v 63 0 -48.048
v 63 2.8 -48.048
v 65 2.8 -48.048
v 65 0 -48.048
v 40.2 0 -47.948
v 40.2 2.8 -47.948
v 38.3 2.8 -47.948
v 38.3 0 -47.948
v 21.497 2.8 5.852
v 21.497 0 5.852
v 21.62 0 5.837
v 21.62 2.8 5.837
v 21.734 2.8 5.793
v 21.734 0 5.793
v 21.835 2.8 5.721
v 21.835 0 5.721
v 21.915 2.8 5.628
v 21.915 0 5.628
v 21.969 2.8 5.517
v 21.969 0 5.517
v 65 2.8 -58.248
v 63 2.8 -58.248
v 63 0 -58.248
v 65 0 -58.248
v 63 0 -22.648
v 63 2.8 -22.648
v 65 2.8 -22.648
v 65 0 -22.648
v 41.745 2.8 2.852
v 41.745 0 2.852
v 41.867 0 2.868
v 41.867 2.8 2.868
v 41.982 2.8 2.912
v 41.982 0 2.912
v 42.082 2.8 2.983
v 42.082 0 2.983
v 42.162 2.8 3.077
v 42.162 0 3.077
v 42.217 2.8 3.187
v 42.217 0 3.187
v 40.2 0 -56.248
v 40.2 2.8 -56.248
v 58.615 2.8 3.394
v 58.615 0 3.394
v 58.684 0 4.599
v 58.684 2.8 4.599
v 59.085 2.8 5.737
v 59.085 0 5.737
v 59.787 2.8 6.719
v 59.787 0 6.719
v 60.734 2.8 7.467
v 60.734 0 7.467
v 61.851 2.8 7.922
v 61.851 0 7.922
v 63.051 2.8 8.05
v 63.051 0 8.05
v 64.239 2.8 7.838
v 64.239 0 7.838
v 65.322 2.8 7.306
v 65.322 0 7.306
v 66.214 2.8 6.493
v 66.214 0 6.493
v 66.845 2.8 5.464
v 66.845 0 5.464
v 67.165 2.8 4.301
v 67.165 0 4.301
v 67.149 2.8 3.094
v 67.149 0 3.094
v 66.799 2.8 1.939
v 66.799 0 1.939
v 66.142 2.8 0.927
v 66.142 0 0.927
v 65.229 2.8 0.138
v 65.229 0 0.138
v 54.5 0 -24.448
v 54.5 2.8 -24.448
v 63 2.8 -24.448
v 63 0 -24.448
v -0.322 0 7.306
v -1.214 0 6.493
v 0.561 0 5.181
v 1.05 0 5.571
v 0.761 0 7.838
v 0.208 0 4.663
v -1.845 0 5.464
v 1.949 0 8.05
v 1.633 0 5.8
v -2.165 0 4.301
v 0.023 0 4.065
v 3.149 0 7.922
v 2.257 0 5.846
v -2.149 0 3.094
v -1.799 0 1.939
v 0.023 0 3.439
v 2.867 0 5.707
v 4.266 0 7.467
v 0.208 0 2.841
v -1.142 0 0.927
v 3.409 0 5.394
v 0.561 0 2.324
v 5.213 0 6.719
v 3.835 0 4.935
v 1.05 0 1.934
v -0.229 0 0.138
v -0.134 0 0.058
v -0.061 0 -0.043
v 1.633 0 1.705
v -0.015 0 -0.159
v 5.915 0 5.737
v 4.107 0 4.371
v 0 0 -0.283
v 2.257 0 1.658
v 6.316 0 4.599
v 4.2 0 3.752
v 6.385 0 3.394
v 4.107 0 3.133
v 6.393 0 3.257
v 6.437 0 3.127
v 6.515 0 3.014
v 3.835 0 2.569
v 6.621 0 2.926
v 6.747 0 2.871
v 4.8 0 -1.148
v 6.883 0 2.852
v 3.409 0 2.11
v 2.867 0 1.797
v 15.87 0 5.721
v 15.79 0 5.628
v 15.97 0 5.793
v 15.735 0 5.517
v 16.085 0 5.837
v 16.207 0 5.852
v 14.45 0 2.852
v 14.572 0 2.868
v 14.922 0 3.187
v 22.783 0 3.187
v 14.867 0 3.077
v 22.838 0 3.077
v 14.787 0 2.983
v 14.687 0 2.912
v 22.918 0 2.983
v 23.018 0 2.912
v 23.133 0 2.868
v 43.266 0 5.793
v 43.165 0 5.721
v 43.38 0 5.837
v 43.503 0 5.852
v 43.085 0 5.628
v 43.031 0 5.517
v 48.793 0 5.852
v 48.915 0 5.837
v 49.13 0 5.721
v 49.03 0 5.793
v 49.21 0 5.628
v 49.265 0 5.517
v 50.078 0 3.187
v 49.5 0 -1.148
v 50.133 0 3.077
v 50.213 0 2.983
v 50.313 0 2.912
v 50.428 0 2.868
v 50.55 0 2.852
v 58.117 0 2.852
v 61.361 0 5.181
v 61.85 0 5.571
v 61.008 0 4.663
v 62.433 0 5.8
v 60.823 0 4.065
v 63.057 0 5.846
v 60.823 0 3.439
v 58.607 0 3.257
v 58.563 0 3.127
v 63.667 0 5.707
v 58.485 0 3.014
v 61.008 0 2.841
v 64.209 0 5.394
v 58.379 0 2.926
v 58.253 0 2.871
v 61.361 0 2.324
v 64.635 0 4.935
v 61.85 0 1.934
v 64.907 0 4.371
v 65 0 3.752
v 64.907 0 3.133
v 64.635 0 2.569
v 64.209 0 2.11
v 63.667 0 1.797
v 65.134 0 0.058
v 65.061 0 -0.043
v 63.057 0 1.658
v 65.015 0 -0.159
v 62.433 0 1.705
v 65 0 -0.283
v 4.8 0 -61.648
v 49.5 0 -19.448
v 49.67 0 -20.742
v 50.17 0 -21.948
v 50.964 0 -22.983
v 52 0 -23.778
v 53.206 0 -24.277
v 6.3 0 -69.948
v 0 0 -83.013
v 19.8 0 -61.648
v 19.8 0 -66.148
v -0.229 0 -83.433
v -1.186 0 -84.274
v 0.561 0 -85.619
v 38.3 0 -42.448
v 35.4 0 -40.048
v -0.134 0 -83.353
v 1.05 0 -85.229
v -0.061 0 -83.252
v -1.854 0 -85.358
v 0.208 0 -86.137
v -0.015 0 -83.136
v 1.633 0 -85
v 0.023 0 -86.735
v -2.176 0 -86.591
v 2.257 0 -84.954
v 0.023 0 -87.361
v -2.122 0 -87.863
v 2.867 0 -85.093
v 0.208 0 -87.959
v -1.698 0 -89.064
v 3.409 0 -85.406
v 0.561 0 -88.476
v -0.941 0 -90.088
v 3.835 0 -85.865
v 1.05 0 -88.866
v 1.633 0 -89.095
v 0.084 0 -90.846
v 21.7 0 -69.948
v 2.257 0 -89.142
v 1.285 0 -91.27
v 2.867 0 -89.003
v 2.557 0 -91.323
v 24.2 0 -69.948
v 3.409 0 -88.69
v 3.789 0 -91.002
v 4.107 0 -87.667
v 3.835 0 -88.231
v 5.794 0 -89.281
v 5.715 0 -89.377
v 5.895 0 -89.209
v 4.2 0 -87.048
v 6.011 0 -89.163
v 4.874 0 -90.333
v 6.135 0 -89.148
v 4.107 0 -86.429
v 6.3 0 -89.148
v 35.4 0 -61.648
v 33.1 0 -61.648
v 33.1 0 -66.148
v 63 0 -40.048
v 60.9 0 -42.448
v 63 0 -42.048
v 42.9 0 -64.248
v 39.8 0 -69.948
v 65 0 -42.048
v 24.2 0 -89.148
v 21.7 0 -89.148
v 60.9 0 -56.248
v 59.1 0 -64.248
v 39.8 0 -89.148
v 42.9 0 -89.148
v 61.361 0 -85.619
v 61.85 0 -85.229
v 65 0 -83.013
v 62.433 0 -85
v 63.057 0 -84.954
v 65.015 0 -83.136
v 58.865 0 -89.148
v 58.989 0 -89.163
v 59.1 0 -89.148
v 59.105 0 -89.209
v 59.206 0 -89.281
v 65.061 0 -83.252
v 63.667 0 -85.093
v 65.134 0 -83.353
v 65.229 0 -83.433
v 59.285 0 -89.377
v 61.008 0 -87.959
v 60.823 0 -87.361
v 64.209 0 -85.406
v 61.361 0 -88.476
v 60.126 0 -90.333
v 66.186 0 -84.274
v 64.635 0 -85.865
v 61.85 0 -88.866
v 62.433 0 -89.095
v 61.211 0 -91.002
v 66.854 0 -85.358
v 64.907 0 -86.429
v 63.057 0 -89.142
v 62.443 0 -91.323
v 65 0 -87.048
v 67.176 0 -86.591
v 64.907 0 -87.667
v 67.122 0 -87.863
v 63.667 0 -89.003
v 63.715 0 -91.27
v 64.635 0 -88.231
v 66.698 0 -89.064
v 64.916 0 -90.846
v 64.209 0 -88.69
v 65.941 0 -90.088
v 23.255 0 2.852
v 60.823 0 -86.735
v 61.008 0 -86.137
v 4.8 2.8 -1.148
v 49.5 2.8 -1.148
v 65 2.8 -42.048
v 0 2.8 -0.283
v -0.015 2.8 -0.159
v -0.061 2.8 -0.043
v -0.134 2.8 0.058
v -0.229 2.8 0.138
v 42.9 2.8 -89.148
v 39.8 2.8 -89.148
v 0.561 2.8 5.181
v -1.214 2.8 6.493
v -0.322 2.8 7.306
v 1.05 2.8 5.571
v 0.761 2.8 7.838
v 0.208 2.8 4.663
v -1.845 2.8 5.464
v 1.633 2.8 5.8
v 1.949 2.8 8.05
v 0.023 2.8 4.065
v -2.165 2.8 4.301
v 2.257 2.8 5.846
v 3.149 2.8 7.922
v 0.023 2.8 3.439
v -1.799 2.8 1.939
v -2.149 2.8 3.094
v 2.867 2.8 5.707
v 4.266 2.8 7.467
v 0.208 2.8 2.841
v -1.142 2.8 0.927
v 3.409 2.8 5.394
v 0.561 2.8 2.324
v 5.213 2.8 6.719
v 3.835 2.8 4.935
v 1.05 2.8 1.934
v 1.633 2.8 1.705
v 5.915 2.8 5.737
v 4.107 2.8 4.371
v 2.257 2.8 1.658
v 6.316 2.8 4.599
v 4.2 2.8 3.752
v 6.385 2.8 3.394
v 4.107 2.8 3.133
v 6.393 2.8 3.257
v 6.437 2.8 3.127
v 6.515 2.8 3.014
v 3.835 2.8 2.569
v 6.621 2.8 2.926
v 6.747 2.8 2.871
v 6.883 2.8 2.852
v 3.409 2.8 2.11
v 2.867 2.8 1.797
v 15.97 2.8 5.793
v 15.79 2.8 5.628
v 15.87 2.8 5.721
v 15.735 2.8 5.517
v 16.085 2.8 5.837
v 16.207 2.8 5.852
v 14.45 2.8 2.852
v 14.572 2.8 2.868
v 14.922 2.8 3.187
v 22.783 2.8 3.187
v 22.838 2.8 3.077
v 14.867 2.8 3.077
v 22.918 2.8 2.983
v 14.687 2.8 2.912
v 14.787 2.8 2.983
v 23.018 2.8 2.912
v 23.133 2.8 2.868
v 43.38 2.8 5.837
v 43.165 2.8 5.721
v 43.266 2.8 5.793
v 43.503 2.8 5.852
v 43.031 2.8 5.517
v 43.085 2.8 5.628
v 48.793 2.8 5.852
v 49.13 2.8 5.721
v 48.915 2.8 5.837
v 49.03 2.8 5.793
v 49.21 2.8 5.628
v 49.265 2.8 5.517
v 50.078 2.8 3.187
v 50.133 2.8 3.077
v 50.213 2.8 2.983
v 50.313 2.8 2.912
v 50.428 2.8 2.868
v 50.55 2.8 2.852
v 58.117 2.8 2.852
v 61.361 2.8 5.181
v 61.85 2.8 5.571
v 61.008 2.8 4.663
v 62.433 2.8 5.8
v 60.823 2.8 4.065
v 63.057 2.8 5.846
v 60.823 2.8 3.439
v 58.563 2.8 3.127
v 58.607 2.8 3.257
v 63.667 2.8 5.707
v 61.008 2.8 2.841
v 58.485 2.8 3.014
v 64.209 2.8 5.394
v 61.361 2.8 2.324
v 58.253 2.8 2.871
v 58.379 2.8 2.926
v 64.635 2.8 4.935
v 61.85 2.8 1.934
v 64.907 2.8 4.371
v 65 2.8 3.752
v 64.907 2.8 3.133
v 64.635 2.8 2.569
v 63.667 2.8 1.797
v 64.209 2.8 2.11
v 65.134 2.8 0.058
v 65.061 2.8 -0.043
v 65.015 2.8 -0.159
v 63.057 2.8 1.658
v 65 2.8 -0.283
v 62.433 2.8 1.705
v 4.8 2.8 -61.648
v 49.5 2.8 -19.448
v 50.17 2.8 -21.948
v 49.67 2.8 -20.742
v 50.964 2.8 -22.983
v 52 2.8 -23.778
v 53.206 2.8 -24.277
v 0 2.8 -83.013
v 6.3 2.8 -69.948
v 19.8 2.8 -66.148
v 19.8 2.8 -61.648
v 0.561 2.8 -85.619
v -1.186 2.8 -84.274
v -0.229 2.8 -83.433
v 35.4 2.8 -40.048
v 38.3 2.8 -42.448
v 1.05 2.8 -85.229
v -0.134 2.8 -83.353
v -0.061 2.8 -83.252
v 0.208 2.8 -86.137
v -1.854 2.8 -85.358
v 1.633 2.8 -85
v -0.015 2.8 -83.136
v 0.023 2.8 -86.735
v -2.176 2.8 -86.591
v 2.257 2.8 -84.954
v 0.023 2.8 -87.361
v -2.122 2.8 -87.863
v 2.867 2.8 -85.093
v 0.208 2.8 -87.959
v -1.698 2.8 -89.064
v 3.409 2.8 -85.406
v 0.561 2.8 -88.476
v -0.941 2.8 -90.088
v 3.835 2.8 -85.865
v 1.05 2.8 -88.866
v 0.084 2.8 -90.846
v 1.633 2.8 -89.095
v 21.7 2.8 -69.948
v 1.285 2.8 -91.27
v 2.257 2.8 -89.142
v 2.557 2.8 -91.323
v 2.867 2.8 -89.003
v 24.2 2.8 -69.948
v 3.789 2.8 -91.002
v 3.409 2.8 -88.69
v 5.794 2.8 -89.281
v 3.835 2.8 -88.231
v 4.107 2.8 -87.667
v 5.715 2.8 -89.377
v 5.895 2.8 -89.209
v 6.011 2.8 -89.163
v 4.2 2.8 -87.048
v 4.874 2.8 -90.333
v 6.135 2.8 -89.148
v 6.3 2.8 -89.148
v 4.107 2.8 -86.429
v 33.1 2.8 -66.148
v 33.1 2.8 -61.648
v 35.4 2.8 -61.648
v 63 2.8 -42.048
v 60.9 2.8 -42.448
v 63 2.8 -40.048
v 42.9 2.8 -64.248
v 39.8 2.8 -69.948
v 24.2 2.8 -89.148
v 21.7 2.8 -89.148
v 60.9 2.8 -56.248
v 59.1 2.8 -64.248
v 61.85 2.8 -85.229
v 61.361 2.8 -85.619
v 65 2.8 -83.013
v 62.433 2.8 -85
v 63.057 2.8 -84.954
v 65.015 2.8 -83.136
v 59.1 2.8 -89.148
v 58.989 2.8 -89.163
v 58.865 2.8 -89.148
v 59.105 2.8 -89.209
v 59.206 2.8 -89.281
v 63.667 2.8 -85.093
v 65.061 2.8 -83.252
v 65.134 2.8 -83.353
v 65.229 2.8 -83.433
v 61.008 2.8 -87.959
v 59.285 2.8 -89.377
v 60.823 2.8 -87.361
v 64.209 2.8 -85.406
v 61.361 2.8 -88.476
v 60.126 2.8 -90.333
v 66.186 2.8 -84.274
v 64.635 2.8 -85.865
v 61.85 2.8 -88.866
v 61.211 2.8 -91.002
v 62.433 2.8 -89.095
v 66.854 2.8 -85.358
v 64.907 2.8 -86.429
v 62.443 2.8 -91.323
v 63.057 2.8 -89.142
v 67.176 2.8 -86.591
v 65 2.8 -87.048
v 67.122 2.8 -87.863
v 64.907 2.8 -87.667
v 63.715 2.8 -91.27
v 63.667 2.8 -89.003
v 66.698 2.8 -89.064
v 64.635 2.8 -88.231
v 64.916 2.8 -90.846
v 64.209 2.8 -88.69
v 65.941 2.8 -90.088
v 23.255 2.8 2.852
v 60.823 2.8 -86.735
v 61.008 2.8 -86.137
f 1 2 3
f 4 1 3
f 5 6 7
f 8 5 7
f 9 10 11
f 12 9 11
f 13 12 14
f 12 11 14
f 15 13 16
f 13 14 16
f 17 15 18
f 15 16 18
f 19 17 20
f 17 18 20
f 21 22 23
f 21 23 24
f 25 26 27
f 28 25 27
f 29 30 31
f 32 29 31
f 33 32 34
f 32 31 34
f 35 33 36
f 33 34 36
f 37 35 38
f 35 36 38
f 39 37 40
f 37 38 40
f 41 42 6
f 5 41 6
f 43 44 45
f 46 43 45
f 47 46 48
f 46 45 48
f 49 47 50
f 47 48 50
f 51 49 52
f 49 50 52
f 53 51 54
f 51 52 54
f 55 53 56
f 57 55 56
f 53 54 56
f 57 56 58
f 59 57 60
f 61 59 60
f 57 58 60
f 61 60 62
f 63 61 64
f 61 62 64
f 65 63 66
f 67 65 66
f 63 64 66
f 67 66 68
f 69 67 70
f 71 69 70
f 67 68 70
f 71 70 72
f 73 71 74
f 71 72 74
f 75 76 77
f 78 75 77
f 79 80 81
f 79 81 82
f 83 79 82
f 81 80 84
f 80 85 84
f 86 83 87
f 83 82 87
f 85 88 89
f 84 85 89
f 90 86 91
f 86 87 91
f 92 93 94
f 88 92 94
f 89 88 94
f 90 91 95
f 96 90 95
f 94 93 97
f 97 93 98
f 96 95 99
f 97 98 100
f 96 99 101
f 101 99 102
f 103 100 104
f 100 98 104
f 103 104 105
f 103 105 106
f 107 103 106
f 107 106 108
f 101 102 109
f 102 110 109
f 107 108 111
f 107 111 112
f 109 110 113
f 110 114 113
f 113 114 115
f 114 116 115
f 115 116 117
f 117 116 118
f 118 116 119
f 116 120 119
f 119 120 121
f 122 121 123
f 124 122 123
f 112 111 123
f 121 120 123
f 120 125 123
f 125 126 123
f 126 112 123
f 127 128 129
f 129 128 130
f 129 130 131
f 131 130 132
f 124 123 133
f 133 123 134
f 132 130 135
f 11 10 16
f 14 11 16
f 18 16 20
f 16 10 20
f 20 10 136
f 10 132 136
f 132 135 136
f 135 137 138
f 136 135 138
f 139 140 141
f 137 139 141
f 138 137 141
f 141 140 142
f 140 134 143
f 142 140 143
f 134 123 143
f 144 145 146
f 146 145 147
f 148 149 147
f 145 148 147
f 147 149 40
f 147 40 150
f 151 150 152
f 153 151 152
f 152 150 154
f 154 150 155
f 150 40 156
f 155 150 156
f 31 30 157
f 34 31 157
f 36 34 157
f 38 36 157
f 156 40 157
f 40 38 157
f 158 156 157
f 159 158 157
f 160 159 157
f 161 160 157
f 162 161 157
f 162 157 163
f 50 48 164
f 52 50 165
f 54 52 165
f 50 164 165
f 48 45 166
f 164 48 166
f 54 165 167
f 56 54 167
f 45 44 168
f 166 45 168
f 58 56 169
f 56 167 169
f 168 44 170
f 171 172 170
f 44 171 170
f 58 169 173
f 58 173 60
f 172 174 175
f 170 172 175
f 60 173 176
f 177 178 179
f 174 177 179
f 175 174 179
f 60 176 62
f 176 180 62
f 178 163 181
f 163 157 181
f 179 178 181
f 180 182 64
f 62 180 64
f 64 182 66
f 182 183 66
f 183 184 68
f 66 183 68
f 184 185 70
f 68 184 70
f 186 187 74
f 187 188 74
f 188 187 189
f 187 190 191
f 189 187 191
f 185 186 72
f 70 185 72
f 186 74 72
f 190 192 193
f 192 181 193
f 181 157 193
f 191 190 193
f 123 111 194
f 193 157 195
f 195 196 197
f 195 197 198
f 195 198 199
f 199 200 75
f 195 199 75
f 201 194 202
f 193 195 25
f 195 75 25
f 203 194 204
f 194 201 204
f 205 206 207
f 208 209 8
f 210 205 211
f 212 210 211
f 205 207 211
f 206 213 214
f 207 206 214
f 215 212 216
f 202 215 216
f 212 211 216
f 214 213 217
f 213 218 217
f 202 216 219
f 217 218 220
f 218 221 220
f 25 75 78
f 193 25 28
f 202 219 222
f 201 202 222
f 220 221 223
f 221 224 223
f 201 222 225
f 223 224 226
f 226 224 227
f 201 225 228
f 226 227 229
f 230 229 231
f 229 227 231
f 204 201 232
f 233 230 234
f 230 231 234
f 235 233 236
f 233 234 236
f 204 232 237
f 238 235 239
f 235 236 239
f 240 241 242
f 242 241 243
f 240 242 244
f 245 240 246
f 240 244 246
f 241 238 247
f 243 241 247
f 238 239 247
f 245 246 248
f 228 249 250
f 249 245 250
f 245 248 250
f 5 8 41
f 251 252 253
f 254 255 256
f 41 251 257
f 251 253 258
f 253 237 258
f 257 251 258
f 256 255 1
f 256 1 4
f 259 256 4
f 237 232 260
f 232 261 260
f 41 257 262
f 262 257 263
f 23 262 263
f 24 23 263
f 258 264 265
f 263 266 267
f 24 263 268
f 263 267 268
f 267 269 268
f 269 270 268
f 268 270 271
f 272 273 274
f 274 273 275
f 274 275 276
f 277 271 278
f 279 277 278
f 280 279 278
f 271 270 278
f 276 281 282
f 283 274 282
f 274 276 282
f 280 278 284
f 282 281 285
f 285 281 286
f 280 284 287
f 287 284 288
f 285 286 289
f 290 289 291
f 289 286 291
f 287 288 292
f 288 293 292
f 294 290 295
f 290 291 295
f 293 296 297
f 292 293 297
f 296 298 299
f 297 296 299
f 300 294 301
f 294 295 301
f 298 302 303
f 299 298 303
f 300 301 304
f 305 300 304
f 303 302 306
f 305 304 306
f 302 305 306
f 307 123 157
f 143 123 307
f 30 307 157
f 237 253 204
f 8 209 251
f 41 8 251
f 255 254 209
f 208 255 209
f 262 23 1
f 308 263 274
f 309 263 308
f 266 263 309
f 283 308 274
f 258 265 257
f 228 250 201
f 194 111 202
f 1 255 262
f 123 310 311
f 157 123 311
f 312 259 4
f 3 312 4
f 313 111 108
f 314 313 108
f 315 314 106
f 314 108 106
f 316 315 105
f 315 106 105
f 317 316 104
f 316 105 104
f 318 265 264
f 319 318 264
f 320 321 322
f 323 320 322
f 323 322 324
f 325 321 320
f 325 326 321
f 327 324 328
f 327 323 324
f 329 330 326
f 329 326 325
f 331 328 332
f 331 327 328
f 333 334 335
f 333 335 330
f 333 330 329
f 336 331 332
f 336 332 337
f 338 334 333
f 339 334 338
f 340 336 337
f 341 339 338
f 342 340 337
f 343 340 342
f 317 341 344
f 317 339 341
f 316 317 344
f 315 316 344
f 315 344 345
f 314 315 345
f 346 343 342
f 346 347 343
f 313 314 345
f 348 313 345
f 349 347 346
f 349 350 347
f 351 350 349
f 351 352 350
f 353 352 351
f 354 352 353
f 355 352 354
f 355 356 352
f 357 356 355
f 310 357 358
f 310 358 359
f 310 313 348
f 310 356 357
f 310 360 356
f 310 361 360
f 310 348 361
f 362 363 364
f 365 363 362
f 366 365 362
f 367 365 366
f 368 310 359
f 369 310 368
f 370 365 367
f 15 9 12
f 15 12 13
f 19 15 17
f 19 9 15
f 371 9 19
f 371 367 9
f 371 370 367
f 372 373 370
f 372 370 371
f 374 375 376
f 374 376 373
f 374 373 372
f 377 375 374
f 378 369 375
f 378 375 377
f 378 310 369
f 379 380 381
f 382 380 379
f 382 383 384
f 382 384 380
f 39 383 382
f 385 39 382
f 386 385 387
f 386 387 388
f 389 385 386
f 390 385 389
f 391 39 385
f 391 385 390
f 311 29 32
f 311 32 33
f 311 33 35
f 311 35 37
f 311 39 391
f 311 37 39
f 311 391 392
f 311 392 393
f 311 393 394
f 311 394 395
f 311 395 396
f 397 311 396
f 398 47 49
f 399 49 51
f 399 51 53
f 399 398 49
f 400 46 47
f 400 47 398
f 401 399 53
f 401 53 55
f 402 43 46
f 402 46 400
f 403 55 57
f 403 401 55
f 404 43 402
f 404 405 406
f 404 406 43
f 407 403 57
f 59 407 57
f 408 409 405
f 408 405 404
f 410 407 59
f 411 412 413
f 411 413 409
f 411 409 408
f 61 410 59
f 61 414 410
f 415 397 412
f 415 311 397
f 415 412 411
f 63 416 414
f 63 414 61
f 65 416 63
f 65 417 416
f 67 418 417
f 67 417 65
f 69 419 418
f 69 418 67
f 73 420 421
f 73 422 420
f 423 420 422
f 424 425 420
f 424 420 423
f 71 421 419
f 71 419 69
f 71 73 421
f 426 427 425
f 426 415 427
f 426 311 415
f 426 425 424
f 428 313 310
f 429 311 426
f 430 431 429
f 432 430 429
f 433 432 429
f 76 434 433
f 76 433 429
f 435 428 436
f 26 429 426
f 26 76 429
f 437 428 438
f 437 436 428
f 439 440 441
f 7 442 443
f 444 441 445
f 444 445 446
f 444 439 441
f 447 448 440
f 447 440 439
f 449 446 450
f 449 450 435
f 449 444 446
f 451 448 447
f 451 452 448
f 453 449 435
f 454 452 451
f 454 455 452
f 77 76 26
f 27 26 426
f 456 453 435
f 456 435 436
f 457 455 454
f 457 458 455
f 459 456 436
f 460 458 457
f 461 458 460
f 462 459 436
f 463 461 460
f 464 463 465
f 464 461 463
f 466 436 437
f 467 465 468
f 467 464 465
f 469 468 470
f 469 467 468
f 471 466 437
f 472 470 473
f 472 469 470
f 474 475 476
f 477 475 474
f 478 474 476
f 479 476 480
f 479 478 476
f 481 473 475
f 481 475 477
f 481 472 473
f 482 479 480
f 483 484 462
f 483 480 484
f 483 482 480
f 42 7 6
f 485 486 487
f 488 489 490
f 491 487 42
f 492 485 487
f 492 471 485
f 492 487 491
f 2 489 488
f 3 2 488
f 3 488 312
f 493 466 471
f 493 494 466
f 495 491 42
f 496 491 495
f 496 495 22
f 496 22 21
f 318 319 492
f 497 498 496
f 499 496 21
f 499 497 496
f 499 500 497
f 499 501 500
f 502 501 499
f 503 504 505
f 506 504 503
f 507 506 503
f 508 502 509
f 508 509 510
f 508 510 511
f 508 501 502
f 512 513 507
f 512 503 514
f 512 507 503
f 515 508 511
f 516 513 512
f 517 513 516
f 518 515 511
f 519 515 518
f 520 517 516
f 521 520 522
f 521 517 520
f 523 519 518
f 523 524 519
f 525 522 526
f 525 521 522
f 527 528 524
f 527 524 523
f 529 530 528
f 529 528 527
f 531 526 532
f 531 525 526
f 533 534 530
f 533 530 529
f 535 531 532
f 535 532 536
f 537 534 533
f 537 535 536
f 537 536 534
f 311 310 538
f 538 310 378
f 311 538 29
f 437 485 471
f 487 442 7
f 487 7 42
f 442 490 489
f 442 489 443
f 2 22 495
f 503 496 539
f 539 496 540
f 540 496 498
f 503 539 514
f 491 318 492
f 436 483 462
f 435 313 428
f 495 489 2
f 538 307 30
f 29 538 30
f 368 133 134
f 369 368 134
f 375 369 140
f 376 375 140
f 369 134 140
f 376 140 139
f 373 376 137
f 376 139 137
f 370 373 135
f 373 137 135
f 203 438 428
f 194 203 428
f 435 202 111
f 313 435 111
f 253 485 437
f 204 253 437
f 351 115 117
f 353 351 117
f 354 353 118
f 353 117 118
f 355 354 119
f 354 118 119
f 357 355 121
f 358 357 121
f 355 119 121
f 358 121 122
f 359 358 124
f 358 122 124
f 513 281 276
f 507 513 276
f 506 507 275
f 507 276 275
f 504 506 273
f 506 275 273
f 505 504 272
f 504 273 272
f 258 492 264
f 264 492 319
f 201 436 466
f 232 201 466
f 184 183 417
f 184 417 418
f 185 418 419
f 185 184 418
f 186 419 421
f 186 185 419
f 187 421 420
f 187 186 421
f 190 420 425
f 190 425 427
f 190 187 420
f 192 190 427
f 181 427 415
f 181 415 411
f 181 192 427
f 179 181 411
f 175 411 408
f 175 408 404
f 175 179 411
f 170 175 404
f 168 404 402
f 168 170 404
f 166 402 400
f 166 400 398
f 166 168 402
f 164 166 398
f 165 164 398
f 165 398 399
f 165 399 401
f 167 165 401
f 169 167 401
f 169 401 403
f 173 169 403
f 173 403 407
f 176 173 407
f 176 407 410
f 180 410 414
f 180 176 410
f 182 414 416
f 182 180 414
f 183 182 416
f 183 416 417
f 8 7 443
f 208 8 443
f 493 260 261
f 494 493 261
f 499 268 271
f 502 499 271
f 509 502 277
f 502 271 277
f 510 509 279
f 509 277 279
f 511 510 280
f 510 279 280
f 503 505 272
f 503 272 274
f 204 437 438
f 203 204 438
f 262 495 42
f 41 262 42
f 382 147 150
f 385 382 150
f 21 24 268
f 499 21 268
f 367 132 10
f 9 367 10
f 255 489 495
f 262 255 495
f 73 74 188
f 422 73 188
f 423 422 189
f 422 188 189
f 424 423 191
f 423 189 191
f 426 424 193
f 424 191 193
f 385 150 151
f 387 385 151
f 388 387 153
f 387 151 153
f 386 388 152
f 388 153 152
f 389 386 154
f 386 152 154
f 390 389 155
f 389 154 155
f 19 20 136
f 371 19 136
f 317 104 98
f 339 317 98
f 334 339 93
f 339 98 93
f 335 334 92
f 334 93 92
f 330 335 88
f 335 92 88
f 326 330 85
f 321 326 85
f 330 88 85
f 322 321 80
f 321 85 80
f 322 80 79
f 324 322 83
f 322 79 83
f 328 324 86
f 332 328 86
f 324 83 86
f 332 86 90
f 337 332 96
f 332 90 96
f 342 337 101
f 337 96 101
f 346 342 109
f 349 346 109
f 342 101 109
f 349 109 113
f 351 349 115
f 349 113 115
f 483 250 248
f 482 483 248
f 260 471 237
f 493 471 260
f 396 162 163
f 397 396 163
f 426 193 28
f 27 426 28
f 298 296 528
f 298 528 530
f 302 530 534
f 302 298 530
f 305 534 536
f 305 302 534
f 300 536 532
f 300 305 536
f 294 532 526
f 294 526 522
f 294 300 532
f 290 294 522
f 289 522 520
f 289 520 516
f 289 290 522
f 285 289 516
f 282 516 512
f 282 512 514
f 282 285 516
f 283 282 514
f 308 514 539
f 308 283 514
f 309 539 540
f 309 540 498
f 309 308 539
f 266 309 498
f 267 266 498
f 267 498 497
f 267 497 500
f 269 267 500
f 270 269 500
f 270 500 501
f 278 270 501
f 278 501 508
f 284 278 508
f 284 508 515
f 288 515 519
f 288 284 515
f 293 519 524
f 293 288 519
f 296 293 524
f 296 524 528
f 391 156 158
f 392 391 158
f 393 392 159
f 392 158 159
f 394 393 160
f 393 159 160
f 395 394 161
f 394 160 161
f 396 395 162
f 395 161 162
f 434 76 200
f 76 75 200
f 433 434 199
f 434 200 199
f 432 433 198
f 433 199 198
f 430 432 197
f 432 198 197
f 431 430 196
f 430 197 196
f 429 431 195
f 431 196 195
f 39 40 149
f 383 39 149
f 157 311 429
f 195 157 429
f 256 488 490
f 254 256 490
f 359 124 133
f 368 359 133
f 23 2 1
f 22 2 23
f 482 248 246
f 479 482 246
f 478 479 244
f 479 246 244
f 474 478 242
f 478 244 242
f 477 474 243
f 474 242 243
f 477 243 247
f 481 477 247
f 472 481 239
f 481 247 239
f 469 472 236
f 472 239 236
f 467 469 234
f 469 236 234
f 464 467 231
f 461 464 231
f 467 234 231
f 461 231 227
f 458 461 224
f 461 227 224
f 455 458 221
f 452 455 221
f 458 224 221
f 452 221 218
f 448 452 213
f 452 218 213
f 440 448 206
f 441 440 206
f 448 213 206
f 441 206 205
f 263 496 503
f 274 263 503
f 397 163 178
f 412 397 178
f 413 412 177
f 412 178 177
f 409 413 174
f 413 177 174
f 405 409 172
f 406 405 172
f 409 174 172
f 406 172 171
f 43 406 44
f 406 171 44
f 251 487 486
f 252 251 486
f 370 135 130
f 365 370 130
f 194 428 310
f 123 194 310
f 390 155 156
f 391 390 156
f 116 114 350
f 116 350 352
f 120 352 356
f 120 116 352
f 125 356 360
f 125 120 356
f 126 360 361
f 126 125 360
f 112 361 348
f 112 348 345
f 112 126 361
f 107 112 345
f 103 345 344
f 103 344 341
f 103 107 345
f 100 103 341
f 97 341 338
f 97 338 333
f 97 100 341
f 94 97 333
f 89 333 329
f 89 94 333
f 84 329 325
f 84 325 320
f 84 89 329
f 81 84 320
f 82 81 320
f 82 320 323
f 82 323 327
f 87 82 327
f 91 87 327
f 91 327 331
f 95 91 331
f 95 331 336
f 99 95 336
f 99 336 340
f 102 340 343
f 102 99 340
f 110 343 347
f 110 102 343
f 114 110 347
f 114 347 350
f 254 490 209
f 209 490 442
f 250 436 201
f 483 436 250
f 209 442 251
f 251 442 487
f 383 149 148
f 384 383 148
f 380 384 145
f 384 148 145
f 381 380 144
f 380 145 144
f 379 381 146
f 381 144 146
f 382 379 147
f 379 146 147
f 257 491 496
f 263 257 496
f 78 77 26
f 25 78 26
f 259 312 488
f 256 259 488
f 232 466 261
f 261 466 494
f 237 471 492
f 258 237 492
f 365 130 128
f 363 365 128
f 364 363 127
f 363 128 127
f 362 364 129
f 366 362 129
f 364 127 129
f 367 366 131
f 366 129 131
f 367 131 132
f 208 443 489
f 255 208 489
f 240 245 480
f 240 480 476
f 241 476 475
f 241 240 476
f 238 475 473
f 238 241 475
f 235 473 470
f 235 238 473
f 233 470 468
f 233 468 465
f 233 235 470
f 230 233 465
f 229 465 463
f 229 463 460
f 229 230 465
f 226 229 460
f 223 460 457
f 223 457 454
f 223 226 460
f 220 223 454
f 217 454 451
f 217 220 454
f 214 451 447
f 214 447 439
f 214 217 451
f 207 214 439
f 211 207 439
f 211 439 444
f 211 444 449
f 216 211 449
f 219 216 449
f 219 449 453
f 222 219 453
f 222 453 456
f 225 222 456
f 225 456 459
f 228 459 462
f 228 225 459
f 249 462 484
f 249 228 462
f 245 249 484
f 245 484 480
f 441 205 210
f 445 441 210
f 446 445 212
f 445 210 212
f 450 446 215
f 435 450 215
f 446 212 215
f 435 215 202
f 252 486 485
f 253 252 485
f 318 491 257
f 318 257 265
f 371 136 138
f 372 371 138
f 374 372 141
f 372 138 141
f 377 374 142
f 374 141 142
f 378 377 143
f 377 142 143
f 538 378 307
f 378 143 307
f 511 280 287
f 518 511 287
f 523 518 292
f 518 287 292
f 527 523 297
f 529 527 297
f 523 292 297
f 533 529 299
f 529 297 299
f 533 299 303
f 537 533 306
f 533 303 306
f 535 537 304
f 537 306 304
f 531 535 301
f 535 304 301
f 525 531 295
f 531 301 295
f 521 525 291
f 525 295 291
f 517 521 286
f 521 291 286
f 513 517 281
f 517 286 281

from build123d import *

# Parameters (mm, degrees)
BASEPLATE_OUTLINE_R = 2.1
BASEPLATE_DEPTH     = 2.8
CUT_EXTRUDE1_REACH  = 115.438
SKETCH3_W           = 15.4
SKETCH3_H           = 19.2
SKETCH3_W_2         = 15.6
SKETCH3_W_3         = 16.2
SKETCH3_H_2         = 24.9
CUT_EXTRUDE2_REACH  = 115.438
SKETCH4_W           = 2
SKETCH4_H           = 10.2
FILLET1_R           = 5


# Read off the part's stored shape, not the designer's step: BasePlate
with BuildPart() as part:
    # BasePlate outline → BasePlate (new body)
    with BuildSketch(Plane(origin=(0, 0, 0), x_dir=(1, 0, 0), z_dir=(0, 1, 0))):
        with BuildLine():
            Line((43.502626614, -5.852332608), (48.792614178, -5.852332608))
            ThreePointArc((48.792614178, -5.852332608), (49.082078508, -5.760021707), (49.264659986, -5.517174213))
            Line((49.264659986, -5.517174213), (50.078201202, -3.187491002))
            ThreePointArc((50.078201202, -3.187491002), (50.26078268, -2.944643509), (50.55024701, -2.852332608))
            Line((50.55024701, -2.852332608), (58.116695703, -2.852332608))
            ThreePointArc((58.116695703, -2.852332608), (58.484685739, -3.013831008), (58.614956567, -3.393999275))
            ThreePointArc((58.614956567, -3.393999275), (64.799237397, -7.61016844), (65.229166667, -0.137781095))
            ThreePointArc((65.229166667, -0.137781095), (65.061014427, 0.043158816), (65, 0.282515593))
            Line((65, 0.282515593), (65, 83.012819192))
            ThreePointArc((65, 83.012819192), (65.061014427, 83.252175969), (65.229166667, 83.433115879))
            ThreePointArc((65.229166667, 83.433115879), (65.940559159, 90.088226551), (59.285448487, 89.376834059))
            ThreePointArc((59.285448487, 89.376834059), (59.104508577, 89.208681819), (58.8651518, 89.147667392))
            Line((58.8651518, 89.147667392), (6.1348482, 89.147667392))
            ThreePointArc((6.1348482, 89.147667392), (5.895491423, 89.208681819), (5.714551513, 89.376834059))
            ThreePointArc((5.714551513, 89.376834059), (-0.940559159, 90.088226551), (-0.229166667, 83.433115879))
            ThreePointArc((-0.229166667, 83.433115879), (-0.061014427, 83.252175969), (0, 83.012819192))
            Line((0, 83.012819192), (0, 0.282515593))
            ThreePointArc((0, 0.282515593), (-0.061014427, 0.043158816), (-0.229166667, -0.137781095))
            ThreePointArc((-0.229166667, -0.137781095), (0.200762603, -7.61016844), (6.385043433, -3.393999275))
            ThreePointArc((6.385043433, -3.393999275), (6.515314261, -3.013831008), (6.883304297, -2.852332608))
            Line((6.883304297, -2.852332608), (14.44975299, -2.852332608))
            ThreePointArc((14.44975299, -2.852332608), (14.73921732, -2.944643509), (14.921798798, -3.187491002))
            Line((14.921798798, -3.187491002), (15.735340014, -5.517174213))
            ThreePointArc((15.735340014, -5.517174213), (15.917921492, -5.760021707), (16.207385822, -5.852332608))
            Line((16.207385822, -5.852332608), (21.497373386, -5.852332608))
            ThreePointArc((21.497373386, -5.852332608), (21.786837716, -5.760021707), (21.969419194, -5.517174213))
            Line((21.969419194, -5.517174213), (22.78296041, -3.187491002))
            ThreePointArc((22.78296041, -3.187491002), (22.965541888, -2.944643509), (23.255006218, -2.852332608))
            Line((23.255006218, -2.852332608), (41.744993782, -2.852332608))
            ThreePointArc((41.744993782, -2.852332608), (42.034458112, -2.944643509), (42.21703959, -3.187491002))
            Line((42.21703959, -3.187491002), (43.030580806, -5.517174213))
            ThreePointArc((43.030580806, -5.517174213), (43.213162284, -5.760021707), (43.502626614, -5.852332608))
        make_face()
        with Locations((2.1, -3.752332608)):
            Circle(BASEPLATE_OUTLINE_R, mode=Mode.SUBTRACT)
        with Locations((62.9, -3.752332608)):
            Circle(BASEPLATE_OUTLINE_R, mode=Mode.SUBTRACT)
        with Locations((2.1, 87.047667392)):
            Circle(BASEPLATE_OUTLINE_R, mode=Mode.SUBTRACT)
        with Locations((62.9, 87.047667392)):
            Circle(BASEPLATE_OUTLINE_R, mode=Mode.SUBTRACT)
    extrude(amount=BASEPLATE_DEPTH)

    # Sketch3 → Cut-Extrude1 (cut, up to next)
    with BuildSketch(Plane(origin=(0, 2.8, 0), x_dir=(1, 0, 0), z_dir=(0, 1, 0)), mode=Mode.PRIVATE) as cut_extrude1_sk1:
        Polygon((4.8, 1.147667392), (49.5, 1.147667392), (49.5, 24.447667392), (63, 24.447667392), (63, 22.647667392), (65, 22.647667392), (65, 42.047667392), (63, 42.047667392), (63, 40.047667392), (35.4, 40.047667392), (35.4, 61.647667392), (33.1, 61.647667392), (33.1, 66.147667392), (19.8, 66.147667392), (19.8, 61.647667392), (4.8, 61.647667392), align=None)
    cut_extrude1_tool1 = extrude(cut_extrude1_sk1.sketch, amount=-CUT_EXTRUDE1_REACH, mode=Mode.PRIVATE) & part.part
    # Sketch3 → Cut-Extrude1 (cut, up to next)
    with BuildSketch(Plane(origin=(0, 2.8, 0), x_dir=(1, 0, 0), z_dir=(0, 1, 0)), mode=Mode.PRIVATE) as cut_extrude1_sk2:
        with Locations((14, 79.547667392)):
            Rectangle(SKETCH3_W, SKETCH3_H)
    cut_extrude1_tool2 = extrude(cut_extrude1_sk2.sketch, amount=-CUT_EXTRUDE1_REACH, mode=Mode.PRIVATE) & part.part
    # Sketch3 → Cut-Extrude1 (cut, up to next)
    with BuildSketch(Plane(origin=(0, 2.8, 0), x_dir=(1, 0, 0), z_dir=(0, 1, 0)), mode=Mode.PRIVATE) as cut_extrude1_sk3:
        with Locations((32, 79.547667392)):
            Rectangle(SKETCH3_W_2, SKETCH3_H)
    cut_extrude1_tool3 = extrude(cut_extrude1_sk3.sketch, amount=-CUT_EXTRUDE1_REACH, mode=Mode.PRIVATE) & part.part
    # Sketch3 → Cut-Extrude1 (cut, up to next)
    with BuildSketch(Plane(origin=(0, 2.8, 0), x_dir=(1, 0, 0), z_dir=(0, 1, 0)), mode=Mode.PRIVATE) as cut_extrude1_sk4:
        with Locations((51, 76.697667392)):
            Rectangle(SKETCH3_W_3, SKETCH3_H_2)
    cut_extrude1_tool4 = extrude(cut_extrude1_sk4.sketch, amount=-CUT_EXTRUDE1_REACH, mode=Mode.PRIVATE) & part.part
    add(cut_extrude1_tool1.solids().sort_by_distance((28.204461, 2.8, -30.008726))[0], mode=Mode.SUBTRACT)
    add(cut_extrude1_tool2.solids().sort_by_distance((14, 2.8, -79.547667))[0], mode=Mode.SUBTRACT)
    add(cut_extrude1_tool3.solids().sort_by_distance((32, 2.8, -79.547667))[0], mode=Mode.SUBTRACT)
    add(cut_extrude1_tool4.solids().sort_by_distance((51, 2.8, -76.697667))[0], mode=Mode.SUBTRACT)

    # Sketch4 → Cut-Extrude2 (cut, up to next)
    with BuildSketch(Plane(origin=(0, 2.8, 0), x_dir=(1, 0, 0), z_dir=(0, 1, 0)), mode=Mode.PRIVATE) as cut_extrude2_sk1:
        with Locations((64, 53.147667392)):
            Rectangle(SKETCH4_W, SKETCH4_H)
    cut_extrude2_tool1 = extrude(cut_extrude2_sk1.sketch, amount=-CUT_EXTRUDE2_REACH, mode=Mode.PRIVATE) & part.part
    # Sketch4 → Cut-Extrude2 (cut, up to next)
    with BuildSketch(Plane(origin=(0, 2.8, 0), x_dir=(1, 0, 0), z_dir=(0, 1, 0)), mode=Mode.PRIVATE) as cut_extrude2_sk2:
        Polygon((60.9, 56.247667392), (40.2, 56.247667392), (40.2, 47.947667392), (38.3, 47.947667392), (38.3, 42.447667392), (60.9, 42.447667392), (60.9, 50.047667392), align=None)
    cut_extrude2_tool2 = extrude(cut_extrude2_sk2.sketch, amount=-CUT_EXTRUDE2_REACH, mode=Mode.PRIVATE) & part.part
    add(cut_extrude2_tool1.solids().sort_by_distance((64, 2.8, -53.147667))[0], mode=Mode.SUBTRACT)
    add(cut_extrude2_tool2.solids().sort_by_distance((50.151212, 2.8, -49.20121))[0], mode=Mode.SUBTRACT)

    # Fillet1
    fillet1_edges = [part.edges().sort_by_distance(p)[0] for p in [
        (49.5, 1.4, -24.447667392),
    ]]
    fillet(fillet1_edges, radius=FILLET1_R)


solid = part.part
